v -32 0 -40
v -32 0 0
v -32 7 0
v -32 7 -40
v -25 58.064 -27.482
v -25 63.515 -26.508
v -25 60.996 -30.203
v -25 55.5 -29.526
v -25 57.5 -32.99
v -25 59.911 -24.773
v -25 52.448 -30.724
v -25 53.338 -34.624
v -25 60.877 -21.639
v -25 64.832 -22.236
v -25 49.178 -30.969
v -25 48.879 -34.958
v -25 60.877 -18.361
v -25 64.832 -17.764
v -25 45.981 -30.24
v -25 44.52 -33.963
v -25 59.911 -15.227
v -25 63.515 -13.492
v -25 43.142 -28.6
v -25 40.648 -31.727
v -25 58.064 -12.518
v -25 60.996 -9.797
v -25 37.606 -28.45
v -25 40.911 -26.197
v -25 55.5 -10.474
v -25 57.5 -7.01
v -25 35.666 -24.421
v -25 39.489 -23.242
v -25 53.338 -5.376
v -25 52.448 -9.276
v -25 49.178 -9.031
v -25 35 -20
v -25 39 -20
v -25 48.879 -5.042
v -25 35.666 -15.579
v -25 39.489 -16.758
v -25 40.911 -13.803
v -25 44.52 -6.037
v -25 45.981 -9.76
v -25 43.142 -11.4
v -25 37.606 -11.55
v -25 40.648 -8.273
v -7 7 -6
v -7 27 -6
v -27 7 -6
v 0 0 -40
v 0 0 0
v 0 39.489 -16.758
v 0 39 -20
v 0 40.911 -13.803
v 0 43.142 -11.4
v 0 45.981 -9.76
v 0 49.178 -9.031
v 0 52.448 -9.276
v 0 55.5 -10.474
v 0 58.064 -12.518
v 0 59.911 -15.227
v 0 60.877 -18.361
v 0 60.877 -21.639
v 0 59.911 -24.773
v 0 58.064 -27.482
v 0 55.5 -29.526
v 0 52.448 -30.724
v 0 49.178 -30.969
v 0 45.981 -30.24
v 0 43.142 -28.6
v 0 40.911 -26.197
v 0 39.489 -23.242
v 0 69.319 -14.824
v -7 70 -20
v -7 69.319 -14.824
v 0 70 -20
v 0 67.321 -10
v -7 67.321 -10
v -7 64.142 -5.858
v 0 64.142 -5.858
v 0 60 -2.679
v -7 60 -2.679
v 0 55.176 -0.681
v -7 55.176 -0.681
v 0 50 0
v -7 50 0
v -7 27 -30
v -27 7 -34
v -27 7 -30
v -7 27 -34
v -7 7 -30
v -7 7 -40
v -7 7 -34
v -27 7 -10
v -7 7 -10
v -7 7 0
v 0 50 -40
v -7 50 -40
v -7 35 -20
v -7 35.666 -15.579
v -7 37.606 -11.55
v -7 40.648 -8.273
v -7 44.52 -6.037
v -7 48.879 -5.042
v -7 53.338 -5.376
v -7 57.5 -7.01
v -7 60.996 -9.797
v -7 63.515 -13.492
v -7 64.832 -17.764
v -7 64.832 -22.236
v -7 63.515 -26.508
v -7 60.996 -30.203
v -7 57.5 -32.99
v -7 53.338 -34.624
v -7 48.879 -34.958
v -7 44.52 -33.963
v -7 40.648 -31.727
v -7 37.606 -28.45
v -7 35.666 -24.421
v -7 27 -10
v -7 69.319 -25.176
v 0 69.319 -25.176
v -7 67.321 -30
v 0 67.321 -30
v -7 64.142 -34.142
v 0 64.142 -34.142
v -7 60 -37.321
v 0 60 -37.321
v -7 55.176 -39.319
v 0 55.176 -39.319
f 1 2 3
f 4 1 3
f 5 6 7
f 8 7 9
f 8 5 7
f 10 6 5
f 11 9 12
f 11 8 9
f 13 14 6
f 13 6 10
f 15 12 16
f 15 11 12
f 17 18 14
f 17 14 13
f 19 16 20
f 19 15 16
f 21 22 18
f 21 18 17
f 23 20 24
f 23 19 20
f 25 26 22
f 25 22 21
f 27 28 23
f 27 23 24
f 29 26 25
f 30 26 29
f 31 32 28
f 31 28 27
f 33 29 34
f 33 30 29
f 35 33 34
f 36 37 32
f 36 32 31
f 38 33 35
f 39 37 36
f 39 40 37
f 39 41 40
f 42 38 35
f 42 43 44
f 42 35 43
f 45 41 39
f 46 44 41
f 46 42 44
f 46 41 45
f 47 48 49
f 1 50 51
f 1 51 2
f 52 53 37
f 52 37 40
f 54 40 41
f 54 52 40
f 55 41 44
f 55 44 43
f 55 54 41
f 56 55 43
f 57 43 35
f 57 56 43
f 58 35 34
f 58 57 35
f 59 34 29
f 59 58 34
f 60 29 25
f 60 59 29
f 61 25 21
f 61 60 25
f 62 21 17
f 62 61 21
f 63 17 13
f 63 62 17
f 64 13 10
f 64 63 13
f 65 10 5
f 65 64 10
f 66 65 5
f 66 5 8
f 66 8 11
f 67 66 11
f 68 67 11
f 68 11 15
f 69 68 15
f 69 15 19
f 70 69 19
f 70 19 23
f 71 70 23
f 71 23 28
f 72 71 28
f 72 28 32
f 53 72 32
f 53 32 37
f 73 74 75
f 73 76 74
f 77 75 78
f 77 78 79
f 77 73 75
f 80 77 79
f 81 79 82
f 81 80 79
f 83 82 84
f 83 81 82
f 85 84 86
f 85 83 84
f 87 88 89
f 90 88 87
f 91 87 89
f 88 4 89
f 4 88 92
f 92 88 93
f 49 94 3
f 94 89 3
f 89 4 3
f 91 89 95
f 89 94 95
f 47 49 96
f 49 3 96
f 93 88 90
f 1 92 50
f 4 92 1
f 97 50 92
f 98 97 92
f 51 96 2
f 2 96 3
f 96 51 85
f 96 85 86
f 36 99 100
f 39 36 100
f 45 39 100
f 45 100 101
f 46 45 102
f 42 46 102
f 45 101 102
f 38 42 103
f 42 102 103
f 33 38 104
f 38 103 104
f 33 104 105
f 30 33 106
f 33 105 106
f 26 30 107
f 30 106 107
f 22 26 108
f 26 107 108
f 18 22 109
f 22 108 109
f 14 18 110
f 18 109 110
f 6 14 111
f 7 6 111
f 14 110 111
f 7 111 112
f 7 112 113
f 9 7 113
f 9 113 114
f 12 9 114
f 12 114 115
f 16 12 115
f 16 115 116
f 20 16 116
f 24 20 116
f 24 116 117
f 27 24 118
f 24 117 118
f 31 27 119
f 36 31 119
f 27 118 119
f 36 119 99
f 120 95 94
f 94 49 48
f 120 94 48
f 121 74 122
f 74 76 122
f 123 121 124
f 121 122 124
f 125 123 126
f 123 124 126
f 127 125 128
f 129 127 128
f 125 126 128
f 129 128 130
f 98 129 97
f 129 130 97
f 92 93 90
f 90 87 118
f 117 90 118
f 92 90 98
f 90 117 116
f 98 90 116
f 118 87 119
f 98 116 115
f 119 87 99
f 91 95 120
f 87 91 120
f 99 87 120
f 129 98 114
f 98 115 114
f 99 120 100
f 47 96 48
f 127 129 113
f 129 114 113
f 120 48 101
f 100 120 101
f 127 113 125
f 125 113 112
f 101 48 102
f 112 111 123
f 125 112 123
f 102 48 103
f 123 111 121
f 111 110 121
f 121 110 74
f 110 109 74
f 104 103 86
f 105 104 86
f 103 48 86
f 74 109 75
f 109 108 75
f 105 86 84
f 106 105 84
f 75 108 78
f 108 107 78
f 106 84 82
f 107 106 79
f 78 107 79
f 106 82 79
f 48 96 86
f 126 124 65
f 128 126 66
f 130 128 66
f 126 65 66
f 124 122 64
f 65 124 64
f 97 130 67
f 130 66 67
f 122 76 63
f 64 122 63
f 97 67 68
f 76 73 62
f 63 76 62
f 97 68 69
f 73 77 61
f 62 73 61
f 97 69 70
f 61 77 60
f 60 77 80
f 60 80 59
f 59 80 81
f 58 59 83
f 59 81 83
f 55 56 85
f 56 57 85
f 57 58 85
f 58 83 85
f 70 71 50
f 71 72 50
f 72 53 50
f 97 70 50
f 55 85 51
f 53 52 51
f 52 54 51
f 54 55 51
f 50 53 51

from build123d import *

# Parameters (mm, degrees)
BOSS_EXTRUDE1_DEPTH = 40
FILLET1_R           = 20
BOSS_EXTRUDE2_DEPTH = 10
CUT_EXTRUDE1_DEPTH  = 6
BOSS_EXTRUDE3_DEPTH = 10
CUT_EXTRUDE3_DEPTH  = 6
SKETCH15_R          = 15
SKETCH15_R_2        = 11
BOSS_EXTRUDE4_DEPTH = 18
CUT_EXTRUDE4_START  = -7
SKETCH16_R          = 11
CUT_EXTRUDE4_DEPTH  = 7


with BuildPart() as part:
    # Sketch1 → Boss-Extrude1 (new body)
    with BuildSketch(Plane.XY):
        Polygon((0, 0), (-32, 0), (-32, 7), (-7, 7), (-7, 70), (0, 70), align=None)
    extrude(amount=-BOSS_EXTRUDE1_DEPTH)

    # Fillet1
    fillet1_edges = [part.edges().sort_by_distance(p)[0] for p in [
        (-3.5, 70, 0),
        (-3.5, 70, -40),
    ]]
    fillet(fillet1_edges, radius=FILLET1_R - 0.0001)  # a hair under: the kernel refuses the full size

    # Sketch7 → Boss-Extrude2 (add)
    with BuildSketch(Plane.XY):
        Polygon((-7, 7), (-27, 7), (-7, 27), align=None)
    extrude(amount=-BOSS_EXTRUDE2_DEPTH)

    # Sketch11 → Cut-Extrude1 (cut)
    with BuildSketch(Plane.XY):
        Polygon((-7, 27), (-7, 7), (-27, 7), align=None)
    extrude(amount=-CUT_EXTRUDE1_DEPTH, mode=Mode.SUBTRACT)

    # Sketch12 → Boss-Extrude3 (add)
    with BuildSketch(Plane(origin=(0, 0, -40), x_dir=(-1, 0, 0), z_dir=(0, 0, -1))):
        Polygon((7, 27), (7, 7), (27, 7), align=None)
    extrude(amount=-BOSS_EXTRUDE3_DEPTH)

    # Sketch13 → Cut-Extrude3 (cut)
    with BuildSketch(Plane(origin=(0, 0, -40), x_dir=(-1, 0, 0), z_dir=(0, 0, -1))):
        Polygon((7, 27), (27, 7), (7, 7), align=None)
    extrude(amount=-CUT_EXTRUDE3_DEPTH, mode=Mode.SUBTRACT)

    # Sketch15 → Boss-Extrude4 (add)
    with BuildSketch(Plane.ZY.offset(7)):
        with Locations(Location((-20, 50, 0), (0, 0, 270))):
            Circle(SKETCH15_R)
        with Locations(Location((-20, 50, 0), (0, 0, 270))):
            Circle(SKETCH15_R_2, mode=Mode.SUBTRACT)
    extrude(amount=BOSS_EXTRUDE4_DEPTH)

    # Sketch16 → Cut-Extrude4 (cut)
    with BuildSketch(Plane.ZY.offset(7).offset(CUT_EXTRUDE4_START)):
        with Locations(Location((-20, 50, 0), (0, 0, 270))):
            Circle(SKETCH16_R)
    extrude(amount=CUT_EXTRUDE4_DEPTH, mode=Mode.SUBTRACT)


solid = part.part
